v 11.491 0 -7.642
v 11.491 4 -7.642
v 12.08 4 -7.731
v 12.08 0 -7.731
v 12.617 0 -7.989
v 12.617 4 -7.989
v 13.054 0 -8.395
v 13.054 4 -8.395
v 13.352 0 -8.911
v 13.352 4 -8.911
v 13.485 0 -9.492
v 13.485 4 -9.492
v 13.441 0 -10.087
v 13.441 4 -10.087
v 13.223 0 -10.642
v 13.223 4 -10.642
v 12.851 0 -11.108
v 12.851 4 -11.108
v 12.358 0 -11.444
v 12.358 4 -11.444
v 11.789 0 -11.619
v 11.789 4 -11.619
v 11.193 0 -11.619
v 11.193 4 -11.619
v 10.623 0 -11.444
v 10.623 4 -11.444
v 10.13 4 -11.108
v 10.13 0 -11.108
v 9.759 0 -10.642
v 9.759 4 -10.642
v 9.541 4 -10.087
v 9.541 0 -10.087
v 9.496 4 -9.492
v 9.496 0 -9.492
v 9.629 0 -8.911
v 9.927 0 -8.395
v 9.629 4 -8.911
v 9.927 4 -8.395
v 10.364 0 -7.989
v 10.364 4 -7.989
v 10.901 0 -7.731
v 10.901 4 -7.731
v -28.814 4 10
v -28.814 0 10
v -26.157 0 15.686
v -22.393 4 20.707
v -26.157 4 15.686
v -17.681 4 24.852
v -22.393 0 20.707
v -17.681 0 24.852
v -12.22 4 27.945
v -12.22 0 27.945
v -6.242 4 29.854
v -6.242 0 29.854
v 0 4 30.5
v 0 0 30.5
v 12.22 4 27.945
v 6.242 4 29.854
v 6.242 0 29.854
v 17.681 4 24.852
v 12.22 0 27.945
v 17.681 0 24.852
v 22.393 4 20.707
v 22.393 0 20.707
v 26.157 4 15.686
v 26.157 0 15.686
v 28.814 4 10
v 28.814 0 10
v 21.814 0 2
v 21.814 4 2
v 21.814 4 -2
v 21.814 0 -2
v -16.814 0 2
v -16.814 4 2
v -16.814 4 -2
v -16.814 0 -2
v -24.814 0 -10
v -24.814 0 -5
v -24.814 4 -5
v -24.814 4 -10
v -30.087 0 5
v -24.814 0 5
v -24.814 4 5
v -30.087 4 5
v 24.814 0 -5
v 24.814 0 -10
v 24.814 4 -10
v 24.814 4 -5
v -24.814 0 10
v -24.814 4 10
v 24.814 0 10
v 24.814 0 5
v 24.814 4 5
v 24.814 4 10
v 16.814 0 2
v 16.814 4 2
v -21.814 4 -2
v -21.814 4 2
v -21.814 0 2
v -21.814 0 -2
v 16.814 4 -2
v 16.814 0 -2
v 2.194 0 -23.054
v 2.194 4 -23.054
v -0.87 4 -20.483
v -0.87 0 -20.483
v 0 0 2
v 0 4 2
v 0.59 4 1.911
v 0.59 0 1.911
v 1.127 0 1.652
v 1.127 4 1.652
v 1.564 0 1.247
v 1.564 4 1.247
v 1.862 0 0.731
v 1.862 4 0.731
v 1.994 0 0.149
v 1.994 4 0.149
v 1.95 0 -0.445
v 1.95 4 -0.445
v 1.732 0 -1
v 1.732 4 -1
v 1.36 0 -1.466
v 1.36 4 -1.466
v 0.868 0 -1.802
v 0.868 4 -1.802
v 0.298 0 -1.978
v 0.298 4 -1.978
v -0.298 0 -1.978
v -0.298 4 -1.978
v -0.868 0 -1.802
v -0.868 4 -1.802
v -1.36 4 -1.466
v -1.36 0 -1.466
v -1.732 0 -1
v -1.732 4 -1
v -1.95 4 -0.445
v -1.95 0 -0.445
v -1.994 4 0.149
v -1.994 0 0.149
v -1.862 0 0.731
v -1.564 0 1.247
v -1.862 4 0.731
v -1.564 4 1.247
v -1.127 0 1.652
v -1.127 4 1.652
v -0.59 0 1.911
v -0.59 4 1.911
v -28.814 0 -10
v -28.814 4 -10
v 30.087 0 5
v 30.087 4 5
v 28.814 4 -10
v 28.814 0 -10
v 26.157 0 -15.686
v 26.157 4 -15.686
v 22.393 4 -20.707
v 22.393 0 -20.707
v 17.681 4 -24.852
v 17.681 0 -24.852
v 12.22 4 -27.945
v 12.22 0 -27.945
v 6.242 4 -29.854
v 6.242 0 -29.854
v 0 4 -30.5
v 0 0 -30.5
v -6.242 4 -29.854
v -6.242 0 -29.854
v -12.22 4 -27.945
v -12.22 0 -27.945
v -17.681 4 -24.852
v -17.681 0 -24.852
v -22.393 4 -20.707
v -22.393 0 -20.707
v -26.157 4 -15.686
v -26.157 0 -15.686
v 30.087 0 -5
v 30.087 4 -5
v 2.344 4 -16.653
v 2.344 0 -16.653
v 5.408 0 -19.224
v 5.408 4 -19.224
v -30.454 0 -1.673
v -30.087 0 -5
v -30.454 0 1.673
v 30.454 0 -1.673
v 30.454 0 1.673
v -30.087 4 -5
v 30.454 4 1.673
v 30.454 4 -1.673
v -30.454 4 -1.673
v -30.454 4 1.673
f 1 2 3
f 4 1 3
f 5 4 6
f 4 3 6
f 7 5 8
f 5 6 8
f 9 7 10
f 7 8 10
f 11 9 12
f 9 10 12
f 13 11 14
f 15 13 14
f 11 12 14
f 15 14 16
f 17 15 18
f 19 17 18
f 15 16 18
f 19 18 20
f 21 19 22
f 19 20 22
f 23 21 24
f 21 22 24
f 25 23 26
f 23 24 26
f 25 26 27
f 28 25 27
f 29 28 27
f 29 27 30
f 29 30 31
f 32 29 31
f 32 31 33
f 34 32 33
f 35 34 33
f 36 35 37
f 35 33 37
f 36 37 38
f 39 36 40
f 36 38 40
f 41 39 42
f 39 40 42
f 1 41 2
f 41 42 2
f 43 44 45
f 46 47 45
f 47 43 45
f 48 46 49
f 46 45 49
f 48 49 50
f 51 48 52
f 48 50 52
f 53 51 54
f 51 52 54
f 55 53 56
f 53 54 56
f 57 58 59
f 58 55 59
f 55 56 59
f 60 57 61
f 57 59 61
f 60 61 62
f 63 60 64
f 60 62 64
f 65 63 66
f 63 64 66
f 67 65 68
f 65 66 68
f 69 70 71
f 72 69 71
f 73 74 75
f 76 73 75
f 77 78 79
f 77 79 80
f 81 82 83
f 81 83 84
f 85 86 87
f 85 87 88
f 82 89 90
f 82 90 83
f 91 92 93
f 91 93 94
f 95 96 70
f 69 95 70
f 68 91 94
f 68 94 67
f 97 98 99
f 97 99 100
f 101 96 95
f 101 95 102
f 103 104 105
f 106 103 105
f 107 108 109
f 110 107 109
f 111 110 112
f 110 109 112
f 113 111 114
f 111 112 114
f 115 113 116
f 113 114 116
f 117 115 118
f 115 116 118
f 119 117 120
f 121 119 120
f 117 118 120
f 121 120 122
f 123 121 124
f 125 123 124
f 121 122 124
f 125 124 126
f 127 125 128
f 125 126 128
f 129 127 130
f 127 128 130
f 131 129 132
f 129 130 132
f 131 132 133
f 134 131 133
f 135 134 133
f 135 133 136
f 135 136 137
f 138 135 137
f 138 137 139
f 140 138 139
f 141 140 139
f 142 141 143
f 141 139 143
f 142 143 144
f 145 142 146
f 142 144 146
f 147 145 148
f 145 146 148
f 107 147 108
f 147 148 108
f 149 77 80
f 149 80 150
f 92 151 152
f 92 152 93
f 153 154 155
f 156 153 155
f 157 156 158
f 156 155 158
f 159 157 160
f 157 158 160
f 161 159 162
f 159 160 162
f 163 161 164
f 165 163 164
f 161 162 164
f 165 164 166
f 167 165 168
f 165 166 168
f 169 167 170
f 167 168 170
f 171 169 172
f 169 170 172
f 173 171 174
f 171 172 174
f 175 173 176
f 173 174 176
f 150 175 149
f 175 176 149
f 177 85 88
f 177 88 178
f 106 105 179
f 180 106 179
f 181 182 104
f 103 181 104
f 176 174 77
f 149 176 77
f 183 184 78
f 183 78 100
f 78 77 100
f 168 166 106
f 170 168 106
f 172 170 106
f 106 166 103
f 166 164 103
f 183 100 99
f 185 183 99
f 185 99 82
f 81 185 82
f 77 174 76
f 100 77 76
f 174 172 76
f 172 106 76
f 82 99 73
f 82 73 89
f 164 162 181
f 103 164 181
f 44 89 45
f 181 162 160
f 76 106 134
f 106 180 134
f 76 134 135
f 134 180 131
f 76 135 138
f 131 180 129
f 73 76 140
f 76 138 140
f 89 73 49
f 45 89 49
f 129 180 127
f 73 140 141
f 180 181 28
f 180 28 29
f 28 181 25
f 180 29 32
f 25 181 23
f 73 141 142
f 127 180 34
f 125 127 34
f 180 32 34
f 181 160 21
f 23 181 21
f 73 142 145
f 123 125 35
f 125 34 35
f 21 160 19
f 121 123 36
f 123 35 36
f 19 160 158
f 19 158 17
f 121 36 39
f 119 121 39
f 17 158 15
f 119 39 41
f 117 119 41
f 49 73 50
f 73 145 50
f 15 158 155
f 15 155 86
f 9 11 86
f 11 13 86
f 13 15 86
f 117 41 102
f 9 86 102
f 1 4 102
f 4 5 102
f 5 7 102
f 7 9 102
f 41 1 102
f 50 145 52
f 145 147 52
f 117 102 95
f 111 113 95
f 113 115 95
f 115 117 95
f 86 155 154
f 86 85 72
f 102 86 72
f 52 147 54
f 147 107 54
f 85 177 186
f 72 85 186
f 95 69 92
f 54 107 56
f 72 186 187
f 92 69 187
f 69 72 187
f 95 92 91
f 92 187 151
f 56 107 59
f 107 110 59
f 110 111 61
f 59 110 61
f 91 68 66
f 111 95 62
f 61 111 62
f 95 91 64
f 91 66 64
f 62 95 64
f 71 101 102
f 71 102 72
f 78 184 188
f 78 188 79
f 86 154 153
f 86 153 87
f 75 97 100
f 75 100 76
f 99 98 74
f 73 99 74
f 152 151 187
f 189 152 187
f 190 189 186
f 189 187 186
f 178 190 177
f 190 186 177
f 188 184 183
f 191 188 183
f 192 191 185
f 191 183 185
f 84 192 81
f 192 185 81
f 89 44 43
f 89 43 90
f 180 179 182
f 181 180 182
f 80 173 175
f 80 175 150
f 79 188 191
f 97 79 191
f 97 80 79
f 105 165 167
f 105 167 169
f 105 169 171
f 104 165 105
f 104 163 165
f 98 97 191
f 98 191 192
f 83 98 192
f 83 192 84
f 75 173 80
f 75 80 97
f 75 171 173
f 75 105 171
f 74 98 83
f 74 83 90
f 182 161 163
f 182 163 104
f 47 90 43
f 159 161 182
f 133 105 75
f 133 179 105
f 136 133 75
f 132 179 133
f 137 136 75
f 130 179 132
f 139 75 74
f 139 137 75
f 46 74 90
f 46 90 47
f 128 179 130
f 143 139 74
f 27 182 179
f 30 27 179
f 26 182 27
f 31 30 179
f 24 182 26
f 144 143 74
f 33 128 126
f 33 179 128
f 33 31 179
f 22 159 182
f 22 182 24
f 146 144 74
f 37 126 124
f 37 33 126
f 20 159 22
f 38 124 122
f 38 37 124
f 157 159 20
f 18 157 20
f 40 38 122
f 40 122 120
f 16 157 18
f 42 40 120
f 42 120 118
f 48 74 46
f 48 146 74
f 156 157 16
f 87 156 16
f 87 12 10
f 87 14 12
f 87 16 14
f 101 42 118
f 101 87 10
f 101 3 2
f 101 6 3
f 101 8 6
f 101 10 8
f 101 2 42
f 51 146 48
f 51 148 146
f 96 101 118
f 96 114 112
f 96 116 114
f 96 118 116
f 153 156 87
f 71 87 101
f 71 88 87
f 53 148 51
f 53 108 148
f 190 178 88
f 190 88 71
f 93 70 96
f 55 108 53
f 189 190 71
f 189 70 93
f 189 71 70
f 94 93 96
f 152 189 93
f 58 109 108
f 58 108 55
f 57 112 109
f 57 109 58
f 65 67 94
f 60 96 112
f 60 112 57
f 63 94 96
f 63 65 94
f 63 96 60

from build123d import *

# Parameters (mm, degrees)
CROQUIS1_R              = 30.5
SALIENTE_EXTRUIR1_DEPTH = 4
CROQUIS2_R              = 2
CORTAR_EXTRUIR1_DEPTH   = 4
CORTAR_EXTRUIR3_START   = -4
CORTAR_EXTRUIR3_DEPTH   = 4
CROQUIS6_W              = 5
CROQUIS6_H              = 4
CORTAR_EXTRUIR4_DEPTH   = 4
CROQUIS7_R              = 2
CORTAR_EXTRUIR5_DEPTH   = 4


with BuildPart() as part:
    # Croquis1 → Saliente-Extruir1 (new body)
    with BuildSketch(Plane(origin=(0, 0, 0), x_dir=(1, 0, 0), z_dir=(0, 1, 0))):
        with Locations(Location((0, 0, 0), (0, 0, 270))):
            Circle(CROQUIS1_R)
    extrude(amount=SALIENTE_EXTRUIR1_DEPTH)

    # Croquis2 → Cortar-Extruir1 (cut)
    with BuildSketch(Plane(origin=(0, 4, 0), x_dir=(1, 0, 0), z_dir=(0, 1, 0))):
        with Locations(Location((0, 0, 0), (0, 0, 270))):
            Circle(CROQUIS2_R)
    extrude(amount=-CORTAR_EXTRUIR1_DEPTH, mode=Mode.SUBTRACT)

    # Croquis5 → Cortar-Extruir3 (cut)
    with BuildSketch(Plane(origin=(0, 4, 0), x_dir=(1, 0, 0), z_dir=(0, 1, 0)).offset(CORTAR_EXTRUIR3_START)):
        with BuildLine():
            Line((28.814059068, 5), (30.087372767, 5))
            ThreePointArc((30.087372767, 5), (29.556634924, 7.526973624), (28.814059068, 10))
            Line((28.814059068, 10), (24.814059068, 10))
            Line((24.814059068, 10), (24.814059068, 5))
            Line((24.814059068, 5), (28.814059068, 5))
        make_face()
        with BuildLine():
            Line((30.087372767, -5), (28.814059068, -5))
            Line((28.814059068, -5), (24.814059068, -5))
            Line((24.814059068, -5), (24.814059068, -10))
            Line((24.814059068, -10), (28.814059068, -10))
            ThreePointArc((28.814059068, -10), (29.556634924, -7.526973624), (30.087372767, -5))
        make_face()
        with BuildLine():
            Line((-24.814059068, 5), (-24.814059068, 10))
            Line((-24.814059068, 10), (-28.814059068, 10))
            ThreePointArc((-28.814059068, 10), (-29.556634924, 7.526973624), (-30.087372767, 5))
            Line((-30.087372767, 5), (-28.814059068, 5))
            Line((-28.814059068, 5), (-24.814059068, 5))
        make_face()
        with BuildLine():
            Line((-28.814059068, -10), (-24.814059068, -10))
            Line((-24.814059068, -10), (-24.814059068, -5))
            Line((-24.814059068, -5), (-28.814059068, -5))
            Line((-28.814059068, -5), (-30.087372767, -5))
            ThreePointArc((-30.087372767, -5), (-29.556634924, -7.526973624), (-28.814059068, -10))
        make_face()
    extrude(amount=CORTAR_EXTRUIR3_DEPTH, mode=Mode.SUBTRACT)

    # Croquis6 → Cortar-Extruir4 (cut)
    with BuildSketch(Plane(origin=(0, 4, 0), x_dir=(1, 0, 0), z_dir=(0, 1, 0))):
        with Locations((-19.314059068, 0)):
            Rectangle(CROQUIS6_W, CROQUIS6_H)
        with Locations((19.314059068, 0)):
            Rectangle(CROQUIS6_W, CROQUIS6_H)
    extrude(amount=-CORTAR_EXTRUIR4_DEPTH, mode=Mode.SUBTRACT)

    # Croquis7 → Cortar-Extruir5 (cut)
    with BuildSketch(Plane(origin=(0, 4, 0), x_dir=(1, 0, 0), z_dir=(0, 1, 0))):
        with Locations(Location((11.490666647, 9.641814145, 0), (0, 0, 270))):
            Circle(CROQUIS7_R)
        Polygon((2.194434654, 23.054217761), (-0.869743118, 20.483067322), (2.34419493, 16.652845106), (5.408372702, 19.223995545), align=None)
    extrude(amount=-CORTAR_EXTRUIR5_DEPTH, mode=Mode.SUBTRACT)


solid = part.part
